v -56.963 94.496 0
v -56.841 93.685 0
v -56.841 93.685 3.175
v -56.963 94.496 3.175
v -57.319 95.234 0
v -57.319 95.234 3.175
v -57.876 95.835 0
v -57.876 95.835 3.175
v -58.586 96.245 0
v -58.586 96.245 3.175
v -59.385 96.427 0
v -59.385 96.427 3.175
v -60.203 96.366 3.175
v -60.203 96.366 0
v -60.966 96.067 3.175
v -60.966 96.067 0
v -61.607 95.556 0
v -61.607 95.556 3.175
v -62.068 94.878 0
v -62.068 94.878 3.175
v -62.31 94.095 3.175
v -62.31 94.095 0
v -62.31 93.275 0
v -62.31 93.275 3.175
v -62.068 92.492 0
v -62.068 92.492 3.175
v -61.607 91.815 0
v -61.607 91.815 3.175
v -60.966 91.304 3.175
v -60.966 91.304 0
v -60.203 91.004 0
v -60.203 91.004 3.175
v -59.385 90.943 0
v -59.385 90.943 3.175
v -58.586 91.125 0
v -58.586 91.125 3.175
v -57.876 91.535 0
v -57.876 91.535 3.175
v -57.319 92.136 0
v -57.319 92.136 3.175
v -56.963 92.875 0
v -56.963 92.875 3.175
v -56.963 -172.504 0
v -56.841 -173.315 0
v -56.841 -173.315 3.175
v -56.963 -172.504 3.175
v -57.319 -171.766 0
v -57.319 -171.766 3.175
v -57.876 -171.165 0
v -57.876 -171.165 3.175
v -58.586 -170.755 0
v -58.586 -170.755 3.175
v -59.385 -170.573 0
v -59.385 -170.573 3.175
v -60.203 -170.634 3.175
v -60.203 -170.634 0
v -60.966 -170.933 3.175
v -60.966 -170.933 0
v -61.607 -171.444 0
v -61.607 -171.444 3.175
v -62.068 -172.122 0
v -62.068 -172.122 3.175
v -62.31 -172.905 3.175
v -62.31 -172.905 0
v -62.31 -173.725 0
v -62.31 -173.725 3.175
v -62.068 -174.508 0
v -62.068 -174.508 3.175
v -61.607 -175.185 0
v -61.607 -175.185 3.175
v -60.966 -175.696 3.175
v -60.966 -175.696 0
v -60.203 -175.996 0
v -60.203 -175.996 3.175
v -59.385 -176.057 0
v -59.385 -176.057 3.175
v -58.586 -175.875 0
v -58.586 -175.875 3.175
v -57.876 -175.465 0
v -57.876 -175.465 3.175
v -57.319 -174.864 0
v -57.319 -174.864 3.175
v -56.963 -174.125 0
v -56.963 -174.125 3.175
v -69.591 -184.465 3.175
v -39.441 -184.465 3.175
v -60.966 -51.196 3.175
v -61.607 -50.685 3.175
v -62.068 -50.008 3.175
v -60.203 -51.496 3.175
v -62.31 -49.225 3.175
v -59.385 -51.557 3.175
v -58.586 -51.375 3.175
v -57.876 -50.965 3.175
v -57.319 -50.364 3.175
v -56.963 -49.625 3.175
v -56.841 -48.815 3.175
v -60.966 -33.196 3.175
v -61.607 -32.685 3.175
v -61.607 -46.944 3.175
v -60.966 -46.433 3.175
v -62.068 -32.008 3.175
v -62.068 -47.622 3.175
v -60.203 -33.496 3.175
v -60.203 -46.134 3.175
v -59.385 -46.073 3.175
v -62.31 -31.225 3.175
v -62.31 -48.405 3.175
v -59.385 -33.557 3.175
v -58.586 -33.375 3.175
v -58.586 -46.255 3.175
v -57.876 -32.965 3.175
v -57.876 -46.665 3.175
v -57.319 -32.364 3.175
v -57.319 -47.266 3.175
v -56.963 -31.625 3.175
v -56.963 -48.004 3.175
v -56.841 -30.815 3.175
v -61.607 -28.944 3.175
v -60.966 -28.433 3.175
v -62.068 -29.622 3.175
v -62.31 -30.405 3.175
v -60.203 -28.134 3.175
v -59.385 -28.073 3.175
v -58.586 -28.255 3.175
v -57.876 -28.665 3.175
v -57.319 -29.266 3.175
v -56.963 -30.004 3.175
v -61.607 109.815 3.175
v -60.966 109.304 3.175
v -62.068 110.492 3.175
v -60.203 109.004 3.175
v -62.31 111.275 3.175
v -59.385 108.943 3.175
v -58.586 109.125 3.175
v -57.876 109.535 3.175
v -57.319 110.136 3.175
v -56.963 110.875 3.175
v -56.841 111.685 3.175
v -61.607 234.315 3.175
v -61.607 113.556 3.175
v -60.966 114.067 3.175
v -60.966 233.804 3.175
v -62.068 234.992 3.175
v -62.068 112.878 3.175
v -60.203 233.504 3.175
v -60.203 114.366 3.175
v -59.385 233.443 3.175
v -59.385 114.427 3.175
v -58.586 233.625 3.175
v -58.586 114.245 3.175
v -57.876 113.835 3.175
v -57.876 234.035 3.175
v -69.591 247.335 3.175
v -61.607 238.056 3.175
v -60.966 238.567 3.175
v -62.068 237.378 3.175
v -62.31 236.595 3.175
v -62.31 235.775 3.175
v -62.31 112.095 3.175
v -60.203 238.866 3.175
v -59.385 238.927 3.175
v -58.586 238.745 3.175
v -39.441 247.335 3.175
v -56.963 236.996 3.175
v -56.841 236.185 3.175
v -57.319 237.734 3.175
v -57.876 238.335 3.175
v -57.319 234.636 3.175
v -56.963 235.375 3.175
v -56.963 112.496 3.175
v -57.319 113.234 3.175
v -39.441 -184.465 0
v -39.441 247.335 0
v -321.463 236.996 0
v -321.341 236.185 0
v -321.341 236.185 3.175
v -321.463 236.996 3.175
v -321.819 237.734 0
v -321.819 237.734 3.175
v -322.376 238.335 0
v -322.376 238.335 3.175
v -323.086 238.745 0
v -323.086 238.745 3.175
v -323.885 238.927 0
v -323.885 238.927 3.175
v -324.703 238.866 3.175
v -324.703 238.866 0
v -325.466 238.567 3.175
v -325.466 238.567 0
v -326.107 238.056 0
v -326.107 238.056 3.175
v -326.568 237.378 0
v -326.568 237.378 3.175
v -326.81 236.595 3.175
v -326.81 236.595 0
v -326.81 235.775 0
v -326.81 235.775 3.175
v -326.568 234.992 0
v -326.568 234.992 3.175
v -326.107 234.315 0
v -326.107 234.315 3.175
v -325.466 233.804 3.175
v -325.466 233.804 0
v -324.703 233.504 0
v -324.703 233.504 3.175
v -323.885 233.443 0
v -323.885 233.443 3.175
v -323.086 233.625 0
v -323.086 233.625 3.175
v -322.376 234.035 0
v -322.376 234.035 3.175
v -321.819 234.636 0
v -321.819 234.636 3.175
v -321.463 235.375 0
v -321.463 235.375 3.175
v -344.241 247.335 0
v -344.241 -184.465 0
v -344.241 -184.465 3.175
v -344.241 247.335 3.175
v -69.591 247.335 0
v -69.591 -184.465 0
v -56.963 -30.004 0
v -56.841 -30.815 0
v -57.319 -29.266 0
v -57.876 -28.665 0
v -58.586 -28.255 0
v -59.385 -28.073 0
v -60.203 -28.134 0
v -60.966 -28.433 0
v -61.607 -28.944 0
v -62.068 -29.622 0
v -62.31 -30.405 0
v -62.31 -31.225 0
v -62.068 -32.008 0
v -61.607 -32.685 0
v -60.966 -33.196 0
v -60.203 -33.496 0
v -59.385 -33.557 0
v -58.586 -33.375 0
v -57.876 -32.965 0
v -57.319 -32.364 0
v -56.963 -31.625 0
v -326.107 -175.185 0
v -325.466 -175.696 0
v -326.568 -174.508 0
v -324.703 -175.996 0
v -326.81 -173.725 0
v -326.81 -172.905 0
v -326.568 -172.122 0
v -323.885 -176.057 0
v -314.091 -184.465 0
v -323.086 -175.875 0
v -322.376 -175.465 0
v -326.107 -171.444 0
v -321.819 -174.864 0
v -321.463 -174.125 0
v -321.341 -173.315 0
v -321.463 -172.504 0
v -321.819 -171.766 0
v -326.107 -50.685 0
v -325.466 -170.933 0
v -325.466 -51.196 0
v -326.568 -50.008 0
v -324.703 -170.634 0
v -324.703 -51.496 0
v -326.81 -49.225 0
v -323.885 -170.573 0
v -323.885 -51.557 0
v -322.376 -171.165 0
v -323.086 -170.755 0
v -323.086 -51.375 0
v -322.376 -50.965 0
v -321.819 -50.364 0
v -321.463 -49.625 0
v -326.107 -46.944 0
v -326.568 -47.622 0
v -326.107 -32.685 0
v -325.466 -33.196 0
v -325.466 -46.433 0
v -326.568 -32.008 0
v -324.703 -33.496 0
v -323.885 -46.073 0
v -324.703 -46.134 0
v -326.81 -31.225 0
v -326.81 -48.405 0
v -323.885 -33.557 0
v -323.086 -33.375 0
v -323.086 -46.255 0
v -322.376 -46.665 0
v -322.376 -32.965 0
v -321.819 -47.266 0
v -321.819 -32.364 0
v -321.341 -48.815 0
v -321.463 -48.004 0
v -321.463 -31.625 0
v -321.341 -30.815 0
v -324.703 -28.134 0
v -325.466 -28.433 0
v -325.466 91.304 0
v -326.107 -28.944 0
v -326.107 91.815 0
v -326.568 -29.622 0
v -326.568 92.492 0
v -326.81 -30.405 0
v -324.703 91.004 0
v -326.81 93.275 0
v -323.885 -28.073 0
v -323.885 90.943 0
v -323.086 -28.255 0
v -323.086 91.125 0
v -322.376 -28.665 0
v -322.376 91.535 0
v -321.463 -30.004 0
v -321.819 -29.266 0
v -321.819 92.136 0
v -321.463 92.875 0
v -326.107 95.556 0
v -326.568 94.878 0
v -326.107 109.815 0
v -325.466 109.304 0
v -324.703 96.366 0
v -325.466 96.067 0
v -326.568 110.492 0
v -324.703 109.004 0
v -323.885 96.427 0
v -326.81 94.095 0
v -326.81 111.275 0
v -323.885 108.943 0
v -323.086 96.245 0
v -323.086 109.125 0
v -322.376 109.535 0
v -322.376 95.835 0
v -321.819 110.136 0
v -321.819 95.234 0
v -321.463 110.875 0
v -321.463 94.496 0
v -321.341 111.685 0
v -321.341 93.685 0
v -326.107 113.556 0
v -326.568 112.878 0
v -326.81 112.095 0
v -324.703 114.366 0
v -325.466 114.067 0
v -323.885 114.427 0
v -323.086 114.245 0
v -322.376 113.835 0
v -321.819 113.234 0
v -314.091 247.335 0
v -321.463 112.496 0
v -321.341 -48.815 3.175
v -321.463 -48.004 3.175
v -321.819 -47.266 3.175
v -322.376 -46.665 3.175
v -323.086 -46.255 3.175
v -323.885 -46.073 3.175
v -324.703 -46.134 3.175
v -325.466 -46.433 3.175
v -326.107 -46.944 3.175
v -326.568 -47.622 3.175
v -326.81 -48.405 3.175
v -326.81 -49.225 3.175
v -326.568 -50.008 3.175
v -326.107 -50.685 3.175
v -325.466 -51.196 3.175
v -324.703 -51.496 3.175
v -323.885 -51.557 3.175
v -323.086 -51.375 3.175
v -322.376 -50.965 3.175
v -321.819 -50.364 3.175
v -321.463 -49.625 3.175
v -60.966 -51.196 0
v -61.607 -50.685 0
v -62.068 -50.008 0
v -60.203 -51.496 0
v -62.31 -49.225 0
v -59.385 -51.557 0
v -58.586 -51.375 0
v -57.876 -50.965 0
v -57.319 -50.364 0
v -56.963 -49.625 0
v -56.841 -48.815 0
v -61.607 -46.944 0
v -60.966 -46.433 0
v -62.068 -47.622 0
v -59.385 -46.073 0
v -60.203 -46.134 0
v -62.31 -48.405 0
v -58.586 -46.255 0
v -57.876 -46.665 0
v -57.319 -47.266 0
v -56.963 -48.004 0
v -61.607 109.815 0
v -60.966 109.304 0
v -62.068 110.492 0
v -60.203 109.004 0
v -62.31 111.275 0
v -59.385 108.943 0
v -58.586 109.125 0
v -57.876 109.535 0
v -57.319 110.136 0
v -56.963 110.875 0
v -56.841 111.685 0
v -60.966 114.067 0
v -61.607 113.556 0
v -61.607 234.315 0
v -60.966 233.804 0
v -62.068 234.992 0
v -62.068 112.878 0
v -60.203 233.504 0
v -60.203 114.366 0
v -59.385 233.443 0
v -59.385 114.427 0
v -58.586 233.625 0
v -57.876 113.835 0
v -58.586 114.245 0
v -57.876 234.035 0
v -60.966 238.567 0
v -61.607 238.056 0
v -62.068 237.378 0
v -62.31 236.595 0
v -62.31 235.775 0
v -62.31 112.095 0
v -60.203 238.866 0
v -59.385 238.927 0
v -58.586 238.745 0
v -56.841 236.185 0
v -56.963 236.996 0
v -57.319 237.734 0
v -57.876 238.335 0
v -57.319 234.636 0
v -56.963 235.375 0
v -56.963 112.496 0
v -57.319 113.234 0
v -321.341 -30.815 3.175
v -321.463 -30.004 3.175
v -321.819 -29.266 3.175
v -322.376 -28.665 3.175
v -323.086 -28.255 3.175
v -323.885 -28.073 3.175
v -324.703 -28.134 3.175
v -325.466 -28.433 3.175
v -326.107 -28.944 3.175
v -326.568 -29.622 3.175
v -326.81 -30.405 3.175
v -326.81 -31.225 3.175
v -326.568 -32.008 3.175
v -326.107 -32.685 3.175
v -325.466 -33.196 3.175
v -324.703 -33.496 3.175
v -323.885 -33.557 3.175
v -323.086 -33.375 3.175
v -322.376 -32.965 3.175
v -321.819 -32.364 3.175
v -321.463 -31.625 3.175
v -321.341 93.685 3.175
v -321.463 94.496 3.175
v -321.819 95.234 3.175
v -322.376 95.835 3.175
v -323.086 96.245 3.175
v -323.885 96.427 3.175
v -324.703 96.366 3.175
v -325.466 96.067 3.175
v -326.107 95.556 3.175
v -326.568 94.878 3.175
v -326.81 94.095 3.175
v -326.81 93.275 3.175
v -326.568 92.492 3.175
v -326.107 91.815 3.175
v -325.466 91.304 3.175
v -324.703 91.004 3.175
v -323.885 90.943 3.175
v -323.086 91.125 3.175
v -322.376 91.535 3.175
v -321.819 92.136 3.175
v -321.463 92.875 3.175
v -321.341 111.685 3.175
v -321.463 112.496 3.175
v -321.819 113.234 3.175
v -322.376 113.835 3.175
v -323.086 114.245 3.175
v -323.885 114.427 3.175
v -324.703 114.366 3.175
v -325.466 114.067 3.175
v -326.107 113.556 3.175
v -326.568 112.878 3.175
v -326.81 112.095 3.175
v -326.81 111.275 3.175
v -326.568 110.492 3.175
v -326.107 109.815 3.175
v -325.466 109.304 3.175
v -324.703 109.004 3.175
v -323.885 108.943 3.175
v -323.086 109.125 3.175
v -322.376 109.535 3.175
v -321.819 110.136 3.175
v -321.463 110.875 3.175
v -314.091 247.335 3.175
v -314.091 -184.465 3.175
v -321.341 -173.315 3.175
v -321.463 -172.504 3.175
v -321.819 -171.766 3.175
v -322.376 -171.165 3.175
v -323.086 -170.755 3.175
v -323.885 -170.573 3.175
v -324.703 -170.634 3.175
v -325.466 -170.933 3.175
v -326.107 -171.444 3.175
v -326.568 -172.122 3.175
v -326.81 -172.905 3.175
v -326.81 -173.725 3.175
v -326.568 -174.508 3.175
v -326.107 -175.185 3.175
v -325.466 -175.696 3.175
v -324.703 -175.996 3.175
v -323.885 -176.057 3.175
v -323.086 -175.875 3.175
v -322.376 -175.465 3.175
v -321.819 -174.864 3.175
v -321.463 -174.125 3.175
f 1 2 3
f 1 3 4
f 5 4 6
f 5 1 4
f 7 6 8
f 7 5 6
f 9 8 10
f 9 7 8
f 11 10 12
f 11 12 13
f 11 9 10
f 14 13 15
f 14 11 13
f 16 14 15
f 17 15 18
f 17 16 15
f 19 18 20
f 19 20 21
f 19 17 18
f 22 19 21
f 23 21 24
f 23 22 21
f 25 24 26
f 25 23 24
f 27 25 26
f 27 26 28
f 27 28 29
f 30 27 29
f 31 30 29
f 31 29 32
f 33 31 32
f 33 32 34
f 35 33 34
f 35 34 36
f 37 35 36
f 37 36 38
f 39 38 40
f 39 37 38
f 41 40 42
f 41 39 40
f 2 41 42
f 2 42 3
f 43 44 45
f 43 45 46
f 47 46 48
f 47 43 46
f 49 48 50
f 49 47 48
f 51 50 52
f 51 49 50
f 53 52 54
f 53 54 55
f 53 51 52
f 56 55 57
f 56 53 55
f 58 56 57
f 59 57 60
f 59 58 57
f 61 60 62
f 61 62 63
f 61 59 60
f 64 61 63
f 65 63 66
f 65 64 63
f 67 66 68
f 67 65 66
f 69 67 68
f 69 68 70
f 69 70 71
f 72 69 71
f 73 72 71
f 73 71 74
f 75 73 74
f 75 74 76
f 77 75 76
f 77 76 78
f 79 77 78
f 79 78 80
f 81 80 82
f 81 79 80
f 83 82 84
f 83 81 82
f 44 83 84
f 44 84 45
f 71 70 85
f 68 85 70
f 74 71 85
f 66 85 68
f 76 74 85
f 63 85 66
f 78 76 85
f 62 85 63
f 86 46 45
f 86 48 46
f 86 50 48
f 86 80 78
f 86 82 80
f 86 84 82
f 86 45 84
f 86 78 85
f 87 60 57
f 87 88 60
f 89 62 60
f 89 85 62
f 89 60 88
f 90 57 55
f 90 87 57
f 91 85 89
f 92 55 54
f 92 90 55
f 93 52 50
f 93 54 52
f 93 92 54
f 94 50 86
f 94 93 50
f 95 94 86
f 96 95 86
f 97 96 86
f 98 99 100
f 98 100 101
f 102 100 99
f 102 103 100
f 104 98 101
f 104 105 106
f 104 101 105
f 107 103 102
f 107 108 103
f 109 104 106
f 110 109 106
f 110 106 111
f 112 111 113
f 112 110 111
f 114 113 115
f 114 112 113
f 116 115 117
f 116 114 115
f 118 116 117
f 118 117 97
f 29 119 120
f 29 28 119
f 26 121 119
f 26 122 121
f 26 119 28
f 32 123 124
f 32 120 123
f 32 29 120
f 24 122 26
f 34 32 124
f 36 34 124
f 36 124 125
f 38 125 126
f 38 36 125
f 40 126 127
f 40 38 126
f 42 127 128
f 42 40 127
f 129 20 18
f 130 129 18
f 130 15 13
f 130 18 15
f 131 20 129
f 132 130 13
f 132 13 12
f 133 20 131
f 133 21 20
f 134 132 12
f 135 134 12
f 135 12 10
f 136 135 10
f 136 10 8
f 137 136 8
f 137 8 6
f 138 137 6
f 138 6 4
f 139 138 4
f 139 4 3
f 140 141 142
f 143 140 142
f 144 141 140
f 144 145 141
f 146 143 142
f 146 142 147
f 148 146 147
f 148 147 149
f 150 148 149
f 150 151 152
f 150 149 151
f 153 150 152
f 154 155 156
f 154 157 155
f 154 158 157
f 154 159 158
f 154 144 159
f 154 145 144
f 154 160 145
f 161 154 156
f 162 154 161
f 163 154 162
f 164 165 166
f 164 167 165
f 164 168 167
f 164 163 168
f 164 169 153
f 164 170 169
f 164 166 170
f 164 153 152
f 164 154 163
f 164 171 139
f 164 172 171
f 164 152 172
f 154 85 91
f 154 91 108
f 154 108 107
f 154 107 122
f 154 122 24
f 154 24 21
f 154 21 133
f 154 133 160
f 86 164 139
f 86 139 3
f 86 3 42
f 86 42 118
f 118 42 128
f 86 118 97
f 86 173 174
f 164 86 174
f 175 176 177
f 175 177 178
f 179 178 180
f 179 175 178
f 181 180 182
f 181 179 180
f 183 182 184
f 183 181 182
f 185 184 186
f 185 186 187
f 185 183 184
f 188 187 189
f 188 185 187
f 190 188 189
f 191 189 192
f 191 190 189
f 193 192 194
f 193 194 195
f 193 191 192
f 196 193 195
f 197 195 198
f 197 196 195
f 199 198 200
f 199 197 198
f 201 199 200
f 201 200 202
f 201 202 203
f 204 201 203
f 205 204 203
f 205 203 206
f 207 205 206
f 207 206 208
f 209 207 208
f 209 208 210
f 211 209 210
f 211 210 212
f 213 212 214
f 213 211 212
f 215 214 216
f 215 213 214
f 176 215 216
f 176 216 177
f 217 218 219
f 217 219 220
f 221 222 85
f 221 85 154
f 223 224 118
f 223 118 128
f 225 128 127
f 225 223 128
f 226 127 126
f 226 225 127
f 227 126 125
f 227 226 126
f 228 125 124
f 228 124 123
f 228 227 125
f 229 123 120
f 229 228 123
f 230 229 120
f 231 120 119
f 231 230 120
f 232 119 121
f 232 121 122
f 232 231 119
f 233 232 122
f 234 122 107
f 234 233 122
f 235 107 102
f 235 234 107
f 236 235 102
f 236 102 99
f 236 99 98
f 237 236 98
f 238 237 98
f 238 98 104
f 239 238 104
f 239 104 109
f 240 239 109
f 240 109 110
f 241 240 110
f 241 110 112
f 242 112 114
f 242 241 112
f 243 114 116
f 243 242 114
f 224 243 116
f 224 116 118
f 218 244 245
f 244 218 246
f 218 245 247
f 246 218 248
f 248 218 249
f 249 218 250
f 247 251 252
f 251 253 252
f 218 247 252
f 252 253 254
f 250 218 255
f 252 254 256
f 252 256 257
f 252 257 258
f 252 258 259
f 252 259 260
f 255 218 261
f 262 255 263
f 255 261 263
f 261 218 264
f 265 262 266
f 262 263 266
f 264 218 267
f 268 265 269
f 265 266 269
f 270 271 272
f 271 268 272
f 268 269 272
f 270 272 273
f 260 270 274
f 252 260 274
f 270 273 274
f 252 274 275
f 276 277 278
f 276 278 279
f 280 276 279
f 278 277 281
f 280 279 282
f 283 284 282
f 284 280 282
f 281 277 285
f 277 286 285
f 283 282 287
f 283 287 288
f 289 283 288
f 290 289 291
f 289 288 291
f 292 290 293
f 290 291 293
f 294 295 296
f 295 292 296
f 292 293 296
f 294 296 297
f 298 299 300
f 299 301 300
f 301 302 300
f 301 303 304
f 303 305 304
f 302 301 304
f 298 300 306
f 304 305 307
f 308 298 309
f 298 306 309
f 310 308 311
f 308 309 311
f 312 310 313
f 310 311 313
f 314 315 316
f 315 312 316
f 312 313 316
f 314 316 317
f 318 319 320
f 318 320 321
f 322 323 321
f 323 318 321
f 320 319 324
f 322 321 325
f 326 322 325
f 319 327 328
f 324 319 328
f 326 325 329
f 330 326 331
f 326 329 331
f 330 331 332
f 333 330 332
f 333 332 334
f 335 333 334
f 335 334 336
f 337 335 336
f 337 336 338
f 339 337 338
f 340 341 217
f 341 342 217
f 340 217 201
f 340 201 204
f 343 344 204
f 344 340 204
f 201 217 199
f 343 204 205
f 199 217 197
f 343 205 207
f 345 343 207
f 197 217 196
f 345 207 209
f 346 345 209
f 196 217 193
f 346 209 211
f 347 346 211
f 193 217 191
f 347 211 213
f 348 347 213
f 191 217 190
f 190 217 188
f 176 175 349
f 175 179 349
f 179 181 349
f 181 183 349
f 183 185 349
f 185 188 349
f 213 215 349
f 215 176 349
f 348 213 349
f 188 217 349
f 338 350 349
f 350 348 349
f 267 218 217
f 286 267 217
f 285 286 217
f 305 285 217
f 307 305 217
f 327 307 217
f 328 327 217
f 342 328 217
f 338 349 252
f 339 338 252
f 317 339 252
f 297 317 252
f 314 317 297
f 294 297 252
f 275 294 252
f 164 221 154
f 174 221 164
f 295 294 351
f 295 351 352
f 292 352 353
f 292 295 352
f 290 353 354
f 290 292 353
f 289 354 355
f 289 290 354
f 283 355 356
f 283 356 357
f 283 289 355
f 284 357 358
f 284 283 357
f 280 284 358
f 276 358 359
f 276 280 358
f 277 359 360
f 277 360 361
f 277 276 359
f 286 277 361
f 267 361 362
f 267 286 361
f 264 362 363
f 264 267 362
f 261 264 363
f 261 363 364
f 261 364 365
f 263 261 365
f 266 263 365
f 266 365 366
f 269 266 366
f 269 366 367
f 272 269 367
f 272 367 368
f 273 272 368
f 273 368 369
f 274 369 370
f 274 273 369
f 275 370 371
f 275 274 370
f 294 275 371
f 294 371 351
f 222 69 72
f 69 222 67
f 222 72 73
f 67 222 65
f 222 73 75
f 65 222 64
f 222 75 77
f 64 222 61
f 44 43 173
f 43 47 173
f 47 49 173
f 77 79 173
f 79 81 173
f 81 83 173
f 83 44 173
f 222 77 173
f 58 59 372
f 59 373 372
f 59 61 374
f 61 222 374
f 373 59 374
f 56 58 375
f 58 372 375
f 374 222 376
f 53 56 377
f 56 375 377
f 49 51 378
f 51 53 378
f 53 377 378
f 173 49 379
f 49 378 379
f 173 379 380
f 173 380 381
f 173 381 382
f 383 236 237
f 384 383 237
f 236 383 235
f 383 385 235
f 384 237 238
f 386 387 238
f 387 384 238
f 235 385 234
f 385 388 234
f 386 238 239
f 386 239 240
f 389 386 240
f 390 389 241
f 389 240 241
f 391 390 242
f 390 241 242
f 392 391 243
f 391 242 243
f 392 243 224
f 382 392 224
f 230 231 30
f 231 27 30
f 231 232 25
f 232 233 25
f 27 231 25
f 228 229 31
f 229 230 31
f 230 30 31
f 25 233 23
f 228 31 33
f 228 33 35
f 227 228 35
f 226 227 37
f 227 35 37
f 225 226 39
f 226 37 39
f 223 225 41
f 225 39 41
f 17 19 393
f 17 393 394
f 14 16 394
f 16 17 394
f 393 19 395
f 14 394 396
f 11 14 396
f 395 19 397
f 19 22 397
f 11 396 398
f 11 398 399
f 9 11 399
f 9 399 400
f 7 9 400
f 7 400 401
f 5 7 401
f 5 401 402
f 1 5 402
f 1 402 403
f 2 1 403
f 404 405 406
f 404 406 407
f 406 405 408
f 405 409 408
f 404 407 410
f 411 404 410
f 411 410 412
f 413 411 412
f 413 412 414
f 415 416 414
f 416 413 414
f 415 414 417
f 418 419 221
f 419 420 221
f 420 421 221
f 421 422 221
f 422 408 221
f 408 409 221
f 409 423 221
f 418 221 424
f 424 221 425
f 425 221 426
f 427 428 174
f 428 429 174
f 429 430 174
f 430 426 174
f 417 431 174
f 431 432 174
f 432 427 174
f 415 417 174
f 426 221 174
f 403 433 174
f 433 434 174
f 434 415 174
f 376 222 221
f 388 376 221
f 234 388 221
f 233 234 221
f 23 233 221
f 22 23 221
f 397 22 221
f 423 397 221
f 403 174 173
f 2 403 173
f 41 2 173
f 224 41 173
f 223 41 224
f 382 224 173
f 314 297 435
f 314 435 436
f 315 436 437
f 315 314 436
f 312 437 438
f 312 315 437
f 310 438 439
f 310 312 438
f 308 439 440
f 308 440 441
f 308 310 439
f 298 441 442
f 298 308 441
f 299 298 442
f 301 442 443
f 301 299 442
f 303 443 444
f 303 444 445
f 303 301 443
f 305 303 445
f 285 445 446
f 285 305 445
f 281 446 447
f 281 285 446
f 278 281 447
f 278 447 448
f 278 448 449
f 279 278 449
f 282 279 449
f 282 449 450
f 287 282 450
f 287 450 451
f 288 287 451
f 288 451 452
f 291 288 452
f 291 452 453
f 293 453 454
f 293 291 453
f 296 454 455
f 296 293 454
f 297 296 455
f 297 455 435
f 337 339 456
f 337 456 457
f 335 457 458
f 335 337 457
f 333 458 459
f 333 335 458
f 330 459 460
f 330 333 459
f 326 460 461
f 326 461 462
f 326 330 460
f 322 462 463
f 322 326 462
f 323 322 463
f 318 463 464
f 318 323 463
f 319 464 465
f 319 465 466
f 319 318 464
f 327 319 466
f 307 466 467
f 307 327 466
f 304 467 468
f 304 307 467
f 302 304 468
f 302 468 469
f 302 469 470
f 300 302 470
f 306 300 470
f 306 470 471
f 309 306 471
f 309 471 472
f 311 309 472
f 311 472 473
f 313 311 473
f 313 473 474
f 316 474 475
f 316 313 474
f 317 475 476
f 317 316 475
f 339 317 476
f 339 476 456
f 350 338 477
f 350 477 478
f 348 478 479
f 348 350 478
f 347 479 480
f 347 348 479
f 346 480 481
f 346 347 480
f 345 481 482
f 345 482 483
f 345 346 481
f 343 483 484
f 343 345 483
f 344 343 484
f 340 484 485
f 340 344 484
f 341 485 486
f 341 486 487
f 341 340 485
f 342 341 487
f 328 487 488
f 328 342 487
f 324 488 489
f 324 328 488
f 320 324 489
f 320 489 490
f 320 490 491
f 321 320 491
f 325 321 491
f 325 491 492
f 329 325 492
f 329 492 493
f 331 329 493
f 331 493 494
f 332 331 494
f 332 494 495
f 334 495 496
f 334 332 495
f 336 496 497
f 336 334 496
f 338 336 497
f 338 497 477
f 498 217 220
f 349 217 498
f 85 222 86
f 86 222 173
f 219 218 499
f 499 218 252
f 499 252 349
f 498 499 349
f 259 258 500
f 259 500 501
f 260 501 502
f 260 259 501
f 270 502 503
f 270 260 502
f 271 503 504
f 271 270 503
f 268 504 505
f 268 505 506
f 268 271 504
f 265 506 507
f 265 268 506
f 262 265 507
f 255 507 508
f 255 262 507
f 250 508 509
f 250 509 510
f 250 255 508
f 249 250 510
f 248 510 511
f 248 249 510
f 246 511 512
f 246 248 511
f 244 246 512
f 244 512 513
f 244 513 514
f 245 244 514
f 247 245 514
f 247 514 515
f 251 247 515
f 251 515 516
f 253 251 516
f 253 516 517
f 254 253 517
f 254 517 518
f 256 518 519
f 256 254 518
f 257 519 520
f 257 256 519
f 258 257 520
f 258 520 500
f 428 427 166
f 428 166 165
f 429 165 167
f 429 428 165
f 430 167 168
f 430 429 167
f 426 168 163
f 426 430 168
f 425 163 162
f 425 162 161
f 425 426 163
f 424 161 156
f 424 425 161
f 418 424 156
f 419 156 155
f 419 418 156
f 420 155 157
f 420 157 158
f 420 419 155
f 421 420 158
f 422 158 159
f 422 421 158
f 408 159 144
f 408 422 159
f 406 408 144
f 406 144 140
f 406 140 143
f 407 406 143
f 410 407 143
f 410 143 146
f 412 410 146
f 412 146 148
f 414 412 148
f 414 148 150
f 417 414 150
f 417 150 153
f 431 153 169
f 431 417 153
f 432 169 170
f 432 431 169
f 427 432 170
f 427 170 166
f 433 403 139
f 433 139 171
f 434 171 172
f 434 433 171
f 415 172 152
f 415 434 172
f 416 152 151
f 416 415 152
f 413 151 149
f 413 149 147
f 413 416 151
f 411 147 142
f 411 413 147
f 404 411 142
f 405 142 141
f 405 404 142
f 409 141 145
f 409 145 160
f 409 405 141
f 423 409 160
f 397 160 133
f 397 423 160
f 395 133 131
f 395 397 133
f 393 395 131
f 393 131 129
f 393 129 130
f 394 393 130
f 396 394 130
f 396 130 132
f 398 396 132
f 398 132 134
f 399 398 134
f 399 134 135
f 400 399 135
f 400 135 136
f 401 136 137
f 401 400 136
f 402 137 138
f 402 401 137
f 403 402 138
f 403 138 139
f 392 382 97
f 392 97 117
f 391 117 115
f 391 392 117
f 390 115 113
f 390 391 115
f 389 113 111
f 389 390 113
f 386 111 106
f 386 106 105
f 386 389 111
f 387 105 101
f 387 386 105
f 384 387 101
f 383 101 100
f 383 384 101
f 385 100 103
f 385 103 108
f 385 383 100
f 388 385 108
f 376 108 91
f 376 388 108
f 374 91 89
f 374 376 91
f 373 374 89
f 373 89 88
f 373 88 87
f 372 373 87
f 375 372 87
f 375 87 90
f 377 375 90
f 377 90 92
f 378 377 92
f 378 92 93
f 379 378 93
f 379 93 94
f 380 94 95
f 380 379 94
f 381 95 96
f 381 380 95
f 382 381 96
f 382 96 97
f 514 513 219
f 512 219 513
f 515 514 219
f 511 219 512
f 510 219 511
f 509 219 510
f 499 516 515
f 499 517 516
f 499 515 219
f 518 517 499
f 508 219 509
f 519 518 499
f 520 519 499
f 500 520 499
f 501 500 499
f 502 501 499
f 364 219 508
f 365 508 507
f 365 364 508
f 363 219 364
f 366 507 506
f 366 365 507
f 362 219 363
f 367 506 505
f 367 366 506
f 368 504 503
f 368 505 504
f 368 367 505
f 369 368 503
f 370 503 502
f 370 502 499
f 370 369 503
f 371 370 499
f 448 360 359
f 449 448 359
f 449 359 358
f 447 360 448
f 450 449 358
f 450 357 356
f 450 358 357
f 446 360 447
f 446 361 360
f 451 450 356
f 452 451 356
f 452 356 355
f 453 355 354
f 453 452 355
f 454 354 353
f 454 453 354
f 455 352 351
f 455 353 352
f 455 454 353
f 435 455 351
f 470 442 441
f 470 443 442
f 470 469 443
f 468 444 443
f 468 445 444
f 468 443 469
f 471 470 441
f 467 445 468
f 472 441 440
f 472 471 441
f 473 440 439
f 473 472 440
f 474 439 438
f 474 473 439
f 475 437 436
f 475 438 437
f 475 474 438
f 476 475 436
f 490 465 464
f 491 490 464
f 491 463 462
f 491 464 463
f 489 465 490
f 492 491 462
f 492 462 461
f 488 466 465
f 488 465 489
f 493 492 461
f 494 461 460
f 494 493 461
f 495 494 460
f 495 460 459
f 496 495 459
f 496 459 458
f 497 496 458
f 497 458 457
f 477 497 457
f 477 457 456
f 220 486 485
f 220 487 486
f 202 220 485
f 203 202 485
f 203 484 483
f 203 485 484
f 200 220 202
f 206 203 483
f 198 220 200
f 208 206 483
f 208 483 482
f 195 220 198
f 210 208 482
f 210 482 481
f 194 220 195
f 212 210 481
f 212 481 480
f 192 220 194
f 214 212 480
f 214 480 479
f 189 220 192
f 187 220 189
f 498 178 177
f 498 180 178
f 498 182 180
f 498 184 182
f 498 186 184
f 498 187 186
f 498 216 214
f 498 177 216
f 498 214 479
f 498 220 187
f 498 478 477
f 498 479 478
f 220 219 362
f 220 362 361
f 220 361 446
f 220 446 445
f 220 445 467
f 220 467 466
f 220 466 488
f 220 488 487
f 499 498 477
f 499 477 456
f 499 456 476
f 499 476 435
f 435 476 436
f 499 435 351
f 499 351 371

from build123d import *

# Parameters (mm, degrees)
F0_W     = 30.15
F0_H     = 431.8
F0_R     = 2.75
F1_DEPTH = 3.175


with BuildPart() as f1:
    # F0 (on Top) → F1 (new body)
    with BuildSketch(Plane.XY):
        with Locations((-329.165695, 31.435187)):
            Rectangle(F0_W, F0_H)
        with Locations((-324.090695, -173.314813)):
            Circle(F0_R, mode=Mode.SUBTRACT)
        with Locations((-324.090695, -48.814813)):
            Circle(F0_R, mode=Mode.SUBTRACT)
        with Locations((-324.090695, -30.814813)):
            Circle(F0_R, mode=Mode.SUBTRACT)
        with Locations((-324.090695, 93.685187)):
            Circle(F0_R, mode=Mode.SUBTRACT)
        with Locations((-324.090695, 111.685187)):
            Circle(F0_R, mode=Mode.SUBTRACT)
        with Locations((-324.090695, 236.185187)):
            Circle(F0_R, mode=Mode.SUBTRACT)
        with Locations((-54.515695, 31.435187)):
            Rectangle(F0_W, F0_H)
        with Locations((-59.590695, -173.314813)):
            Circle(F0_R, mode=Mode.SUBTRACT)
        with Locations((-59.590695, -48.814813)):
            Circle(F0_R, mode=Mode.SUBTRACT)
        with Locations((-59.590695, -30.814813)):
            Circle(F0_R, mode=Mode.SUBTRACT)
        with Locations((-59.590695, 93.685187)):
            Circle(F0_R, mode=Mode.SUBTRACT)
        with Locations((-59.590695, 111.685187)):
            Circle(F0_R, mode=Mode.SUBTRACT)
        with Locations((-59.590695, 236.185187)):
            Circle(F0_R, mode=Mode.SUBTRACT)
    extrude(amount=F1_DEPTH)


solid = f1.part
